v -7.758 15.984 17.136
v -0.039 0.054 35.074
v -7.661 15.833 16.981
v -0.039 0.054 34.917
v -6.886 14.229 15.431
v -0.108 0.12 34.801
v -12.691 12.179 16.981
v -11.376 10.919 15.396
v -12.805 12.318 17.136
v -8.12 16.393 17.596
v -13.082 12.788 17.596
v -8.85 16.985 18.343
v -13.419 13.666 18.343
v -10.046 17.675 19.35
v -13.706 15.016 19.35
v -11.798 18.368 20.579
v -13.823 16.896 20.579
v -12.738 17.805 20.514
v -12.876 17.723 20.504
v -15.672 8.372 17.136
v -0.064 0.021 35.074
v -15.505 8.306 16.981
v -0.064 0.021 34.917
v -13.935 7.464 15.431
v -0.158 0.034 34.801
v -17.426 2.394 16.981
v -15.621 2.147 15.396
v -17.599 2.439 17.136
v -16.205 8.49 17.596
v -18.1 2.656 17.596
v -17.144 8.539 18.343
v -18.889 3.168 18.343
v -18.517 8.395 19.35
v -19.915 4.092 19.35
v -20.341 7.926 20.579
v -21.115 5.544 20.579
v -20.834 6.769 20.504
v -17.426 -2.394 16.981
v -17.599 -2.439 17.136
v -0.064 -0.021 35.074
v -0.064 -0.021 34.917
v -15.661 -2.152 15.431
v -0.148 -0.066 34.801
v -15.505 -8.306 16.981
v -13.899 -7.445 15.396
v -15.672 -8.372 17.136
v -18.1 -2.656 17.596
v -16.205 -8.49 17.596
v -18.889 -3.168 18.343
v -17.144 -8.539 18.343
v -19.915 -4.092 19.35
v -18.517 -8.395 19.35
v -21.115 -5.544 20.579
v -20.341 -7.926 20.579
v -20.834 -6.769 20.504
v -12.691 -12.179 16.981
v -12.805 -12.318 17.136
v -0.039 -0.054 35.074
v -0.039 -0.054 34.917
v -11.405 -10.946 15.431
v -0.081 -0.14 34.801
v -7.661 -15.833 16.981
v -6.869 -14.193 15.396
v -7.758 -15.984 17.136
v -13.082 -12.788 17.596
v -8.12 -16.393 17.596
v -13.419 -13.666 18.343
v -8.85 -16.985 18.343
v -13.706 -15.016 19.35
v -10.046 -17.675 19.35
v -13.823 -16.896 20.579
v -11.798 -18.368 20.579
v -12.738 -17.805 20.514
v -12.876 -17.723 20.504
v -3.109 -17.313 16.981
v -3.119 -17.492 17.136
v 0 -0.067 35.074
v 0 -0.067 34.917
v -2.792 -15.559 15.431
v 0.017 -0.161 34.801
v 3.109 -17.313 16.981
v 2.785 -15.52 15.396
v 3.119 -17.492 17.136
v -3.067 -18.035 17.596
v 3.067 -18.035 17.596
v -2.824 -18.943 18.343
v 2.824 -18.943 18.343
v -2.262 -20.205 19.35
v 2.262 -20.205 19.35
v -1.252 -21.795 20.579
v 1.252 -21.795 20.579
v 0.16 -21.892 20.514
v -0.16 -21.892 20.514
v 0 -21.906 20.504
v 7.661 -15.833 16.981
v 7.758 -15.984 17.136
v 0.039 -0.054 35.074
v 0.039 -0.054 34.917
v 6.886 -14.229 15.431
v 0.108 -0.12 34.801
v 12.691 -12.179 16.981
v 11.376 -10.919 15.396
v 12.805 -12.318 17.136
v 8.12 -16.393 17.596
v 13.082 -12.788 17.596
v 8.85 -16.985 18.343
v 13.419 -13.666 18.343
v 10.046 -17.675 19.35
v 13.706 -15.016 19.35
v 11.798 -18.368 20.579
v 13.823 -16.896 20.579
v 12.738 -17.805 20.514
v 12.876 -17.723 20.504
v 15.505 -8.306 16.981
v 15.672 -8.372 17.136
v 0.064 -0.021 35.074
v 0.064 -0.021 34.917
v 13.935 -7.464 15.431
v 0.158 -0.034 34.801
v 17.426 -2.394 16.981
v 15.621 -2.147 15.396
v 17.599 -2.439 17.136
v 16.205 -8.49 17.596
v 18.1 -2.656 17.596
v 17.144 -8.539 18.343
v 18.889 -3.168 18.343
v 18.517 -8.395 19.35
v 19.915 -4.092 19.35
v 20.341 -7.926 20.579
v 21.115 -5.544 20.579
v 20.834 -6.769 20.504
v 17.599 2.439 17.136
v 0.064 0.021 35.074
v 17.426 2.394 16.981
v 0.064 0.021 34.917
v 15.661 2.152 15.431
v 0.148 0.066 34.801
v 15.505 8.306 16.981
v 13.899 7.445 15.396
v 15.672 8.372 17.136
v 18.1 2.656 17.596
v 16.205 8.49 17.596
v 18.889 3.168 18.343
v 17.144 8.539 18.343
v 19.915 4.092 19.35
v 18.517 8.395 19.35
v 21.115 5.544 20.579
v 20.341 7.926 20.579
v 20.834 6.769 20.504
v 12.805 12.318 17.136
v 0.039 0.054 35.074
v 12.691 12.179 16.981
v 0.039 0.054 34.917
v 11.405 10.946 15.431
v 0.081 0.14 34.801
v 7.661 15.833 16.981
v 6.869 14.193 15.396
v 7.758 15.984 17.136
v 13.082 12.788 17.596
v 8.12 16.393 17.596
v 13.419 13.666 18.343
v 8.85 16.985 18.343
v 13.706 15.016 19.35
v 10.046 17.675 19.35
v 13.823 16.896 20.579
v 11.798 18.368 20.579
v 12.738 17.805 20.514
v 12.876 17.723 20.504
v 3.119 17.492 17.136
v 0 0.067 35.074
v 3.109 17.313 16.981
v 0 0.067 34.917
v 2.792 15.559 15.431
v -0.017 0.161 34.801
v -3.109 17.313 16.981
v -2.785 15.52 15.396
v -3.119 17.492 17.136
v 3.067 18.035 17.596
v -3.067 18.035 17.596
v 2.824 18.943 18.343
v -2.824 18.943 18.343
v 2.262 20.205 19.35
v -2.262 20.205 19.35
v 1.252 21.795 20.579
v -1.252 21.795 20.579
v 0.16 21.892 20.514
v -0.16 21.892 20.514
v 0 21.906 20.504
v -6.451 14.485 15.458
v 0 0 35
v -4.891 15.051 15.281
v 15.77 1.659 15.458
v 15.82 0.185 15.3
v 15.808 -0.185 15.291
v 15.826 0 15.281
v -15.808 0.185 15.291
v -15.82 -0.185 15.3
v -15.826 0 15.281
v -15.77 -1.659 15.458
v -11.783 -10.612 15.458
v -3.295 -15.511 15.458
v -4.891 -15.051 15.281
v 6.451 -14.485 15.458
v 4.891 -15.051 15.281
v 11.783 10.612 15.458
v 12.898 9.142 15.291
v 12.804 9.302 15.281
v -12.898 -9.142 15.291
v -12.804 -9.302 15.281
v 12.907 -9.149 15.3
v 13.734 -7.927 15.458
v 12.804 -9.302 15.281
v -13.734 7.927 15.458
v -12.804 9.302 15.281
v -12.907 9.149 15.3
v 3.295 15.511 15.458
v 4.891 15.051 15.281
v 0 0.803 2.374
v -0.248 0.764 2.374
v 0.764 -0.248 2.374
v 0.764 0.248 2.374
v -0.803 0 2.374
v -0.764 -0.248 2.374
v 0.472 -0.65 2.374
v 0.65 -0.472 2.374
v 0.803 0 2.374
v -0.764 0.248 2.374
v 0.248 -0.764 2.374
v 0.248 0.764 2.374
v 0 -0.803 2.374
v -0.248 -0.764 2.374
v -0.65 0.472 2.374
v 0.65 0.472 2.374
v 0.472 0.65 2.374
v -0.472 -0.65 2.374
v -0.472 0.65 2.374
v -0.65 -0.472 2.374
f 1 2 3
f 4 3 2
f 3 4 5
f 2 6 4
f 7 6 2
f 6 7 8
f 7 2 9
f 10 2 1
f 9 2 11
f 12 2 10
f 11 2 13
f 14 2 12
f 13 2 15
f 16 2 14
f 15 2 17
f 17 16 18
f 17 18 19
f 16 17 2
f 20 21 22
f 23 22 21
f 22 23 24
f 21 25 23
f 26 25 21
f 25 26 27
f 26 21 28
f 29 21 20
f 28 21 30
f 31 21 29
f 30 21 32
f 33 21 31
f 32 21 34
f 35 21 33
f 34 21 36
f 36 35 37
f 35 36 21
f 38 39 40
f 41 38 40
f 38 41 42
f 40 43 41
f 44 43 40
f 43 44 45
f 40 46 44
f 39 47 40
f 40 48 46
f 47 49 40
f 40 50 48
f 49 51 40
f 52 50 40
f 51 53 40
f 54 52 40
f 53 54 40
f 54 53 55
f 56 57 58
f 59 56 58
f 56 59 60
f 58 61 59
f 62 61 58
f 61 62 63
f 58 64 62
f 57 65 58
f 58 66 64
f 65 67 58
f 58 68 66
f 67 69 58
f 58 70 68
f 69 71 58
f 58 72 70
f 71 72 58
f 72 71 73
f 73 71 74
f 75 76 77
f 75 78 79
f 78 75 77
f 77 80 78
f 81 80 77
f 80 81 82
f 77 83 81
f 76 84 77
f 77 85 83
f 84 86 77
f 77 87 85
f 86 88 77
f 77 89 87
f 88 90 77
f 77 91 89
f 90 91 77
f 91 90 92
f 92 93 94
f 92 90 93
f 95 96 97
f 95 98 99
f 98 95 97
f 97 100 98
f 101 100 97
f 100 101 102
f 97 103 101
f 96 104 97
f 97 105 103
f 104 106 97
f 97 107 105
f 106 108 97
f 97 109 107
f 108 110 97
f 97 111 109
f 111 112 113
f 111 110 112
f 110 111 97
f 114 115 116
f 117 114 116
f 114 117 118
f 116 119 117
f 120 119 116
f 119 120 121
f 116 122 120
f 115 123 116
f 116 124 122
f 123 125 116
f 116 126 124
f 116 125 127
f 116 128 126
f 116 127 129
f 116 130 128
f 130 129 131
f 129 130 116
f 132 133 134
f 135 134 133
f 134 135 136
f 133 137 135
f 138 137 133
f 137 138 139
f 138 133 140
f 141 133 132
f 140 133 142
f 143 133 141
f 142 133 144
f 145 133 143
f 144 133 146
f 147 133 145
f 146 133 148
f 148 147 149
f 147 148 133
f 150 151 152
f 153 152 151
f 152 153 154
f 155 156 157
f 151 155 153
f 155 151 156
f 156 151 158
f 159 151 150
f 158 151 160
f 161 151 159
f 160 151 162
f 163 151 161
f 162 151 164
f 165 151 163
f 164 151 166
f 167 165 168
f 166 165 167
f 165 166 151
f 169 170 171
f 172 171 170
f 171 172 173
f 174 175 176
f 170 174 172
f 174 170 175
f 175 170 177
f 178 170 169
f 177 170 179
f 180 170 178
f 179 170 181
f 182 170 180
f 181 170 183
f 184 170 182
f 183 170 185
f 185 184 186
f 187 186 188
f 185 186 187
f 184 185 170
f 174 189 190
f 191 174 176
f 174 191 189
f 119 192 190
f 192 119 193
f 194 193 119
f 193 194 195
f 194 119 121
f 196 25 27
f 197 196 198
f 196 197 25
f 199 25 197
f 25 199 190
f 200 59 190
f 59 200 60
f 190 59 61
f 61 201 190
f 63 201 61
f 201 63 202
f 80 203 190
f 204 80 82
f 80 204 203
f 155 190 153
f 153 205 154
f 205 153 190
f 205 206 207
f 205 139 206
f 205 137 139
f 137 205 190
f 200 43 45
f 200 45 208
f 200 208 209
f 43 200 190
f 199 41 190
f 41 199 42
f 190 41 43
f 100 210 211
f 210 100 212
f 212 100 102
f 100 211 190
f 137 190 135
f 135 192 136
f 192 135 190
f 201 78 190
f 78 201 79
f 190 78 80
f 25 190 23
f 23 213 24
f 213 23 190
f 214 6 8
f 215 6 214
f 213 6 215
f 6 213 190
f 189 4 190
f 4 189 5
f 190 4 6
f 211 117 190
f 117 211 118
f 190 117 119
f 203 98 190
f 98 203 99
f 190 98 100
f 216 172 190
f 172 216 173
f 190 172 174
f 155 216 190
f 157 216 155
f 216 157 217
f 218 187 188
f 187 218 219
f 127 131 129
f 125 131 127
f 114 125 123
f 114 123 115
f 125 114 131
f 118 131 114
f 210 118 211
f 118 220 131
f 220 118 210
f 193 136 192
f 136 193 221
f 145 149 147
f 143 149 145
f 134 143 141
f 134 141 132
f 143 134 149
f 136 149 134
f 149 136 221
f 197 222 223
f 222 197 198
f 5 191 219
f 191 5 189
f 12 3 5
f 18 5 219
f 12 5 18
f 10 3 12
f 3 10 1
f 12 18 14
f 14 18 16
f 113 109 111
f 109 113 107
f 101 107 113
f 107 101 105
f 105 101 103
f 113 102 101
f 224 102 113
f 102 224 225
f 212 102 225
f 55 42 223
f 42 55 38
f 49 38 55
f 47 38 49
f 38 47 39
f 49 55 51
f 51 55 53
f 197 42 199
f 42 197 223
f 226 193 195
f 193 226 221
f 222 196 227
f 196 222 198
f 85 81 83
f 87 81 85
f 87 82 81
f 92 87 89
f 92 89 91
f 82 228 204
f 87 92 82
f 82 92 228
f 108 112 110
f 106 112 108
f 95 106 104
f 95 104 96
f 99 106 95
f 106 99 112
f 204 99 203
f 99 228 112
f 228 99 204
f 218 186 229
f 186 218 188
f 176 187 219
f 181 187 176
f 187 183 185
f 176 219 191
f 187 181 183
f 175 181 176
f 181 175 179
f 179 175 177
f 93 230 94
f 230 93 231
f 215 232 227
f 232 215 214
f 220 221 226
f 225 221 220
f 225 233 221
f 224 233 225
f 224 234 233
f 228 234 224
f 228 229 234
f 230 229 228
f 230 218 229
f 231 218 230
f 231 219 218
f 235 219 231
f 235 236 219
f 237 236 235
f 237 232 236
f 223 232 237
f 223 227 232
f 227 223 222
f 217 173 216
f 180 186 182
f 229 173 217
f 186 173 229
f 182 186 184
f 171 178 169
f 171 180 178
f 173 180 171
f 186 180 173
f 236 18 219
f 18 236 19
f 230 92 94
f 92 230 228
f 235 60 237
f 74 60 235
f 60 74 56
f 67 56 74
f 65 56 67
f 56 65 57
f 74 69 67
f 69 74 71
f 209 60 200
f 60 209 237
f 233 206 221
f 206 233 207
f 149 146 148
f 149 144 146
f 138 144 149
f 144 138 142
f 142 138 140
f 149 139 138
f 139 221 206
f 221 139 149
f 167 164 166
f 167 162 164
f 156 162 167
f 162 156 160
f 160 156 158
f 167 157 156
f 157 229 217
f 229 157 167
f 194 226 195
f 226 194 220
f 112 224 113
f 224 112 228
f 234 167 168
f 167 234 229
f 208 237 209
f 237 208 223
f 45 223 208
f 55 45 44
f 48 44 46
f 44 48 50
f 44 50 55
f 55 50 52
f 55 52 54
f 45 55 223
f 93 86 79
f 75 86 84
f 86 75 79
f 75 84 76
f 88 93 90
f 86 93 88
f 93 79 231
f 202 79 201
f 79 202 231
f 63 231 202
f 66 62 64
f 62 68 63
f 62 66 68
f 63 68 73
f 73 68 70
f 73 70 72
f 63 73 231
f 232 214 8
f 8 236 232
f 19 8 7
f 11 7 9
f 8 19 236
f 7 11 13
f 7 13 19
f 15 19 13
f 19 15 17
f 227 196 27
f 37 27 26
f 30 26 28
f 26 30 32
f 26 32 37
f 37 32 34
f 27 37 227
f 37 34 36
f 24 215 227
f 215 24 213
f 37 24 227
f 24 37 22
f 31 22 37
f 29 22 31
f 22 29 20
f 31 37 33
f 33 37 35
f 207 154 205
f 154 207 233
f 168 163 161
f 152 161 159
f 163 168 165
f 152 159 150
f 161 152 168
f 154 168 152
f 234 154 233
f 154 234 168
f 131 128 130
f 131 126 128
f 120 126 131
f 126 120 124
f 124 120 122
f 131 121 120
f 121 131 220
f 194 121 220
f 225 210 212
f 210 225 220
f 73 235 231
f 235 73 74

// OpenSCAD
use <MCAD/involute_gears.scad>

// dummy arg to workaround customizer bug where first arg changes do not show in preview window
ignore_this=0;

// Which one would you like to see?
part = 1; // [0:Both Gears, 1:1st Gear Only, 2:2nd Gear Only]

// The number of teeth in the 1st gear
gear1_teeth = 10;

// The number of teeth in the 2nd gear (should be odd when generating both at once)
gear2_teeth = 9;

// The desired angle between the input and output shafts 
axis_angle = 90;  

// Controls the relative gear thickness and relative circumference.  Use lower values for thicker gears.
outside_circular_pitch =  600;  

// size of the center holes.  Use 0 for no center holes.
bore_diameter = 0; 

// Controls tooth shape. Lower value for more aggressive engagement, higher for stronger teeth.
pressure_angle = 20;  //[14.5,20,25,30] 

// ///which_gear_to_generate = 0; //[0:Both,1:1st only,2:2nd only]






bevel_gear_pair_v2( gear1_teeth = gear1_teeth
		, gear2_teeth = gear2_teeth
		, axis_angle = axis_angle
		, outside_circular_pitch = outside_circular_pitch
		, bore_diameter = bore_diameter
		, pressure_angle = pressure_angle
		, part = part
);

module bevel_gear_pair_v2( gear1_teeth = 41,
	gear2_teeth = 7,
	axis_angle = 90,
	outside_circular_pitch=1000
	, bore_diameter = 0
	, pressure_angle = 30
	, part = 0	// jab
	)

{
	outside_pitch_radius1 = gear1_teeth * outside_circular_pitch / 360;
	outside_pitch_radius2 = gear2_teeth * outside_circular_pitch / 360;

	pitch_apex1=outside_pitch_radius2 * sin (axis_angle) +
		(outside_pitch_radius2 * cos (axis_angle) + outside_pitch_radius1) / tan (axis_angle);

	cone_distance = sqrt (pow (pitch_apex1, 2) + pow (outside_pitch_radius1, 2));
	pitch_apex2 = sqrt (pow (cone_distance, 2) - pow (outside_pitch_radius2, 2));

	echo ("cone_distance", cone_distance);

	pitch_angle1 = asin (outside_pitch_radius1 / cone_distance);
	pitch_angle2 = asin (outside_pitch_radius2 / cone_distance);

	echo ("pitch_angle1, pitch_angle2", pitch_angle1, pitch_angle2);
	echo ("pitch_angle1 + pitch_angle2", pitch_angle1 + pitch_angle2);

	rotate([0,0,90])
	translate ([0,0,pitch_apex1+20])
	{
		translate([0,0,-pitch_apex1])

		if (part != 2)  // jab
		{
		bevel_gear (
			number_of_teeth=gear1_teeth,
			cone_distance=cone_distance,
			pressure_angle=pressure_angle,
			outside_circular_pitch=outside_circular_pitch
			, bore_diameter=bore_diameter  // jab
			);
		}

		rotate([0,-(pitch_angle1+pitch_angle2),0])
		translate([0,0,-pitch_apex2])

		if (part != 1) // jab
		{
		bevel_gear (
			number_of_teeth=gear2_teeth,
			cone_distance=cone_distance,
			pressure_angle=pressure_angle,
			outside_circular_pitch=outside_circular_pitch
			, bore_diameter=bore_diameter  // jab
);
		}
	}

}


//translate([0,0,-.5]){
//	if(00_build_plate == 0){
//		%cube([285,153,1],center = true);
//	}
//	if(00_build_plate == 1){
//		%cube([225,145,1],center = true);
//	}
//	if(00_build_plate == 3){
//		%cube([120,120,1],center = true);
//	}
//
//}
